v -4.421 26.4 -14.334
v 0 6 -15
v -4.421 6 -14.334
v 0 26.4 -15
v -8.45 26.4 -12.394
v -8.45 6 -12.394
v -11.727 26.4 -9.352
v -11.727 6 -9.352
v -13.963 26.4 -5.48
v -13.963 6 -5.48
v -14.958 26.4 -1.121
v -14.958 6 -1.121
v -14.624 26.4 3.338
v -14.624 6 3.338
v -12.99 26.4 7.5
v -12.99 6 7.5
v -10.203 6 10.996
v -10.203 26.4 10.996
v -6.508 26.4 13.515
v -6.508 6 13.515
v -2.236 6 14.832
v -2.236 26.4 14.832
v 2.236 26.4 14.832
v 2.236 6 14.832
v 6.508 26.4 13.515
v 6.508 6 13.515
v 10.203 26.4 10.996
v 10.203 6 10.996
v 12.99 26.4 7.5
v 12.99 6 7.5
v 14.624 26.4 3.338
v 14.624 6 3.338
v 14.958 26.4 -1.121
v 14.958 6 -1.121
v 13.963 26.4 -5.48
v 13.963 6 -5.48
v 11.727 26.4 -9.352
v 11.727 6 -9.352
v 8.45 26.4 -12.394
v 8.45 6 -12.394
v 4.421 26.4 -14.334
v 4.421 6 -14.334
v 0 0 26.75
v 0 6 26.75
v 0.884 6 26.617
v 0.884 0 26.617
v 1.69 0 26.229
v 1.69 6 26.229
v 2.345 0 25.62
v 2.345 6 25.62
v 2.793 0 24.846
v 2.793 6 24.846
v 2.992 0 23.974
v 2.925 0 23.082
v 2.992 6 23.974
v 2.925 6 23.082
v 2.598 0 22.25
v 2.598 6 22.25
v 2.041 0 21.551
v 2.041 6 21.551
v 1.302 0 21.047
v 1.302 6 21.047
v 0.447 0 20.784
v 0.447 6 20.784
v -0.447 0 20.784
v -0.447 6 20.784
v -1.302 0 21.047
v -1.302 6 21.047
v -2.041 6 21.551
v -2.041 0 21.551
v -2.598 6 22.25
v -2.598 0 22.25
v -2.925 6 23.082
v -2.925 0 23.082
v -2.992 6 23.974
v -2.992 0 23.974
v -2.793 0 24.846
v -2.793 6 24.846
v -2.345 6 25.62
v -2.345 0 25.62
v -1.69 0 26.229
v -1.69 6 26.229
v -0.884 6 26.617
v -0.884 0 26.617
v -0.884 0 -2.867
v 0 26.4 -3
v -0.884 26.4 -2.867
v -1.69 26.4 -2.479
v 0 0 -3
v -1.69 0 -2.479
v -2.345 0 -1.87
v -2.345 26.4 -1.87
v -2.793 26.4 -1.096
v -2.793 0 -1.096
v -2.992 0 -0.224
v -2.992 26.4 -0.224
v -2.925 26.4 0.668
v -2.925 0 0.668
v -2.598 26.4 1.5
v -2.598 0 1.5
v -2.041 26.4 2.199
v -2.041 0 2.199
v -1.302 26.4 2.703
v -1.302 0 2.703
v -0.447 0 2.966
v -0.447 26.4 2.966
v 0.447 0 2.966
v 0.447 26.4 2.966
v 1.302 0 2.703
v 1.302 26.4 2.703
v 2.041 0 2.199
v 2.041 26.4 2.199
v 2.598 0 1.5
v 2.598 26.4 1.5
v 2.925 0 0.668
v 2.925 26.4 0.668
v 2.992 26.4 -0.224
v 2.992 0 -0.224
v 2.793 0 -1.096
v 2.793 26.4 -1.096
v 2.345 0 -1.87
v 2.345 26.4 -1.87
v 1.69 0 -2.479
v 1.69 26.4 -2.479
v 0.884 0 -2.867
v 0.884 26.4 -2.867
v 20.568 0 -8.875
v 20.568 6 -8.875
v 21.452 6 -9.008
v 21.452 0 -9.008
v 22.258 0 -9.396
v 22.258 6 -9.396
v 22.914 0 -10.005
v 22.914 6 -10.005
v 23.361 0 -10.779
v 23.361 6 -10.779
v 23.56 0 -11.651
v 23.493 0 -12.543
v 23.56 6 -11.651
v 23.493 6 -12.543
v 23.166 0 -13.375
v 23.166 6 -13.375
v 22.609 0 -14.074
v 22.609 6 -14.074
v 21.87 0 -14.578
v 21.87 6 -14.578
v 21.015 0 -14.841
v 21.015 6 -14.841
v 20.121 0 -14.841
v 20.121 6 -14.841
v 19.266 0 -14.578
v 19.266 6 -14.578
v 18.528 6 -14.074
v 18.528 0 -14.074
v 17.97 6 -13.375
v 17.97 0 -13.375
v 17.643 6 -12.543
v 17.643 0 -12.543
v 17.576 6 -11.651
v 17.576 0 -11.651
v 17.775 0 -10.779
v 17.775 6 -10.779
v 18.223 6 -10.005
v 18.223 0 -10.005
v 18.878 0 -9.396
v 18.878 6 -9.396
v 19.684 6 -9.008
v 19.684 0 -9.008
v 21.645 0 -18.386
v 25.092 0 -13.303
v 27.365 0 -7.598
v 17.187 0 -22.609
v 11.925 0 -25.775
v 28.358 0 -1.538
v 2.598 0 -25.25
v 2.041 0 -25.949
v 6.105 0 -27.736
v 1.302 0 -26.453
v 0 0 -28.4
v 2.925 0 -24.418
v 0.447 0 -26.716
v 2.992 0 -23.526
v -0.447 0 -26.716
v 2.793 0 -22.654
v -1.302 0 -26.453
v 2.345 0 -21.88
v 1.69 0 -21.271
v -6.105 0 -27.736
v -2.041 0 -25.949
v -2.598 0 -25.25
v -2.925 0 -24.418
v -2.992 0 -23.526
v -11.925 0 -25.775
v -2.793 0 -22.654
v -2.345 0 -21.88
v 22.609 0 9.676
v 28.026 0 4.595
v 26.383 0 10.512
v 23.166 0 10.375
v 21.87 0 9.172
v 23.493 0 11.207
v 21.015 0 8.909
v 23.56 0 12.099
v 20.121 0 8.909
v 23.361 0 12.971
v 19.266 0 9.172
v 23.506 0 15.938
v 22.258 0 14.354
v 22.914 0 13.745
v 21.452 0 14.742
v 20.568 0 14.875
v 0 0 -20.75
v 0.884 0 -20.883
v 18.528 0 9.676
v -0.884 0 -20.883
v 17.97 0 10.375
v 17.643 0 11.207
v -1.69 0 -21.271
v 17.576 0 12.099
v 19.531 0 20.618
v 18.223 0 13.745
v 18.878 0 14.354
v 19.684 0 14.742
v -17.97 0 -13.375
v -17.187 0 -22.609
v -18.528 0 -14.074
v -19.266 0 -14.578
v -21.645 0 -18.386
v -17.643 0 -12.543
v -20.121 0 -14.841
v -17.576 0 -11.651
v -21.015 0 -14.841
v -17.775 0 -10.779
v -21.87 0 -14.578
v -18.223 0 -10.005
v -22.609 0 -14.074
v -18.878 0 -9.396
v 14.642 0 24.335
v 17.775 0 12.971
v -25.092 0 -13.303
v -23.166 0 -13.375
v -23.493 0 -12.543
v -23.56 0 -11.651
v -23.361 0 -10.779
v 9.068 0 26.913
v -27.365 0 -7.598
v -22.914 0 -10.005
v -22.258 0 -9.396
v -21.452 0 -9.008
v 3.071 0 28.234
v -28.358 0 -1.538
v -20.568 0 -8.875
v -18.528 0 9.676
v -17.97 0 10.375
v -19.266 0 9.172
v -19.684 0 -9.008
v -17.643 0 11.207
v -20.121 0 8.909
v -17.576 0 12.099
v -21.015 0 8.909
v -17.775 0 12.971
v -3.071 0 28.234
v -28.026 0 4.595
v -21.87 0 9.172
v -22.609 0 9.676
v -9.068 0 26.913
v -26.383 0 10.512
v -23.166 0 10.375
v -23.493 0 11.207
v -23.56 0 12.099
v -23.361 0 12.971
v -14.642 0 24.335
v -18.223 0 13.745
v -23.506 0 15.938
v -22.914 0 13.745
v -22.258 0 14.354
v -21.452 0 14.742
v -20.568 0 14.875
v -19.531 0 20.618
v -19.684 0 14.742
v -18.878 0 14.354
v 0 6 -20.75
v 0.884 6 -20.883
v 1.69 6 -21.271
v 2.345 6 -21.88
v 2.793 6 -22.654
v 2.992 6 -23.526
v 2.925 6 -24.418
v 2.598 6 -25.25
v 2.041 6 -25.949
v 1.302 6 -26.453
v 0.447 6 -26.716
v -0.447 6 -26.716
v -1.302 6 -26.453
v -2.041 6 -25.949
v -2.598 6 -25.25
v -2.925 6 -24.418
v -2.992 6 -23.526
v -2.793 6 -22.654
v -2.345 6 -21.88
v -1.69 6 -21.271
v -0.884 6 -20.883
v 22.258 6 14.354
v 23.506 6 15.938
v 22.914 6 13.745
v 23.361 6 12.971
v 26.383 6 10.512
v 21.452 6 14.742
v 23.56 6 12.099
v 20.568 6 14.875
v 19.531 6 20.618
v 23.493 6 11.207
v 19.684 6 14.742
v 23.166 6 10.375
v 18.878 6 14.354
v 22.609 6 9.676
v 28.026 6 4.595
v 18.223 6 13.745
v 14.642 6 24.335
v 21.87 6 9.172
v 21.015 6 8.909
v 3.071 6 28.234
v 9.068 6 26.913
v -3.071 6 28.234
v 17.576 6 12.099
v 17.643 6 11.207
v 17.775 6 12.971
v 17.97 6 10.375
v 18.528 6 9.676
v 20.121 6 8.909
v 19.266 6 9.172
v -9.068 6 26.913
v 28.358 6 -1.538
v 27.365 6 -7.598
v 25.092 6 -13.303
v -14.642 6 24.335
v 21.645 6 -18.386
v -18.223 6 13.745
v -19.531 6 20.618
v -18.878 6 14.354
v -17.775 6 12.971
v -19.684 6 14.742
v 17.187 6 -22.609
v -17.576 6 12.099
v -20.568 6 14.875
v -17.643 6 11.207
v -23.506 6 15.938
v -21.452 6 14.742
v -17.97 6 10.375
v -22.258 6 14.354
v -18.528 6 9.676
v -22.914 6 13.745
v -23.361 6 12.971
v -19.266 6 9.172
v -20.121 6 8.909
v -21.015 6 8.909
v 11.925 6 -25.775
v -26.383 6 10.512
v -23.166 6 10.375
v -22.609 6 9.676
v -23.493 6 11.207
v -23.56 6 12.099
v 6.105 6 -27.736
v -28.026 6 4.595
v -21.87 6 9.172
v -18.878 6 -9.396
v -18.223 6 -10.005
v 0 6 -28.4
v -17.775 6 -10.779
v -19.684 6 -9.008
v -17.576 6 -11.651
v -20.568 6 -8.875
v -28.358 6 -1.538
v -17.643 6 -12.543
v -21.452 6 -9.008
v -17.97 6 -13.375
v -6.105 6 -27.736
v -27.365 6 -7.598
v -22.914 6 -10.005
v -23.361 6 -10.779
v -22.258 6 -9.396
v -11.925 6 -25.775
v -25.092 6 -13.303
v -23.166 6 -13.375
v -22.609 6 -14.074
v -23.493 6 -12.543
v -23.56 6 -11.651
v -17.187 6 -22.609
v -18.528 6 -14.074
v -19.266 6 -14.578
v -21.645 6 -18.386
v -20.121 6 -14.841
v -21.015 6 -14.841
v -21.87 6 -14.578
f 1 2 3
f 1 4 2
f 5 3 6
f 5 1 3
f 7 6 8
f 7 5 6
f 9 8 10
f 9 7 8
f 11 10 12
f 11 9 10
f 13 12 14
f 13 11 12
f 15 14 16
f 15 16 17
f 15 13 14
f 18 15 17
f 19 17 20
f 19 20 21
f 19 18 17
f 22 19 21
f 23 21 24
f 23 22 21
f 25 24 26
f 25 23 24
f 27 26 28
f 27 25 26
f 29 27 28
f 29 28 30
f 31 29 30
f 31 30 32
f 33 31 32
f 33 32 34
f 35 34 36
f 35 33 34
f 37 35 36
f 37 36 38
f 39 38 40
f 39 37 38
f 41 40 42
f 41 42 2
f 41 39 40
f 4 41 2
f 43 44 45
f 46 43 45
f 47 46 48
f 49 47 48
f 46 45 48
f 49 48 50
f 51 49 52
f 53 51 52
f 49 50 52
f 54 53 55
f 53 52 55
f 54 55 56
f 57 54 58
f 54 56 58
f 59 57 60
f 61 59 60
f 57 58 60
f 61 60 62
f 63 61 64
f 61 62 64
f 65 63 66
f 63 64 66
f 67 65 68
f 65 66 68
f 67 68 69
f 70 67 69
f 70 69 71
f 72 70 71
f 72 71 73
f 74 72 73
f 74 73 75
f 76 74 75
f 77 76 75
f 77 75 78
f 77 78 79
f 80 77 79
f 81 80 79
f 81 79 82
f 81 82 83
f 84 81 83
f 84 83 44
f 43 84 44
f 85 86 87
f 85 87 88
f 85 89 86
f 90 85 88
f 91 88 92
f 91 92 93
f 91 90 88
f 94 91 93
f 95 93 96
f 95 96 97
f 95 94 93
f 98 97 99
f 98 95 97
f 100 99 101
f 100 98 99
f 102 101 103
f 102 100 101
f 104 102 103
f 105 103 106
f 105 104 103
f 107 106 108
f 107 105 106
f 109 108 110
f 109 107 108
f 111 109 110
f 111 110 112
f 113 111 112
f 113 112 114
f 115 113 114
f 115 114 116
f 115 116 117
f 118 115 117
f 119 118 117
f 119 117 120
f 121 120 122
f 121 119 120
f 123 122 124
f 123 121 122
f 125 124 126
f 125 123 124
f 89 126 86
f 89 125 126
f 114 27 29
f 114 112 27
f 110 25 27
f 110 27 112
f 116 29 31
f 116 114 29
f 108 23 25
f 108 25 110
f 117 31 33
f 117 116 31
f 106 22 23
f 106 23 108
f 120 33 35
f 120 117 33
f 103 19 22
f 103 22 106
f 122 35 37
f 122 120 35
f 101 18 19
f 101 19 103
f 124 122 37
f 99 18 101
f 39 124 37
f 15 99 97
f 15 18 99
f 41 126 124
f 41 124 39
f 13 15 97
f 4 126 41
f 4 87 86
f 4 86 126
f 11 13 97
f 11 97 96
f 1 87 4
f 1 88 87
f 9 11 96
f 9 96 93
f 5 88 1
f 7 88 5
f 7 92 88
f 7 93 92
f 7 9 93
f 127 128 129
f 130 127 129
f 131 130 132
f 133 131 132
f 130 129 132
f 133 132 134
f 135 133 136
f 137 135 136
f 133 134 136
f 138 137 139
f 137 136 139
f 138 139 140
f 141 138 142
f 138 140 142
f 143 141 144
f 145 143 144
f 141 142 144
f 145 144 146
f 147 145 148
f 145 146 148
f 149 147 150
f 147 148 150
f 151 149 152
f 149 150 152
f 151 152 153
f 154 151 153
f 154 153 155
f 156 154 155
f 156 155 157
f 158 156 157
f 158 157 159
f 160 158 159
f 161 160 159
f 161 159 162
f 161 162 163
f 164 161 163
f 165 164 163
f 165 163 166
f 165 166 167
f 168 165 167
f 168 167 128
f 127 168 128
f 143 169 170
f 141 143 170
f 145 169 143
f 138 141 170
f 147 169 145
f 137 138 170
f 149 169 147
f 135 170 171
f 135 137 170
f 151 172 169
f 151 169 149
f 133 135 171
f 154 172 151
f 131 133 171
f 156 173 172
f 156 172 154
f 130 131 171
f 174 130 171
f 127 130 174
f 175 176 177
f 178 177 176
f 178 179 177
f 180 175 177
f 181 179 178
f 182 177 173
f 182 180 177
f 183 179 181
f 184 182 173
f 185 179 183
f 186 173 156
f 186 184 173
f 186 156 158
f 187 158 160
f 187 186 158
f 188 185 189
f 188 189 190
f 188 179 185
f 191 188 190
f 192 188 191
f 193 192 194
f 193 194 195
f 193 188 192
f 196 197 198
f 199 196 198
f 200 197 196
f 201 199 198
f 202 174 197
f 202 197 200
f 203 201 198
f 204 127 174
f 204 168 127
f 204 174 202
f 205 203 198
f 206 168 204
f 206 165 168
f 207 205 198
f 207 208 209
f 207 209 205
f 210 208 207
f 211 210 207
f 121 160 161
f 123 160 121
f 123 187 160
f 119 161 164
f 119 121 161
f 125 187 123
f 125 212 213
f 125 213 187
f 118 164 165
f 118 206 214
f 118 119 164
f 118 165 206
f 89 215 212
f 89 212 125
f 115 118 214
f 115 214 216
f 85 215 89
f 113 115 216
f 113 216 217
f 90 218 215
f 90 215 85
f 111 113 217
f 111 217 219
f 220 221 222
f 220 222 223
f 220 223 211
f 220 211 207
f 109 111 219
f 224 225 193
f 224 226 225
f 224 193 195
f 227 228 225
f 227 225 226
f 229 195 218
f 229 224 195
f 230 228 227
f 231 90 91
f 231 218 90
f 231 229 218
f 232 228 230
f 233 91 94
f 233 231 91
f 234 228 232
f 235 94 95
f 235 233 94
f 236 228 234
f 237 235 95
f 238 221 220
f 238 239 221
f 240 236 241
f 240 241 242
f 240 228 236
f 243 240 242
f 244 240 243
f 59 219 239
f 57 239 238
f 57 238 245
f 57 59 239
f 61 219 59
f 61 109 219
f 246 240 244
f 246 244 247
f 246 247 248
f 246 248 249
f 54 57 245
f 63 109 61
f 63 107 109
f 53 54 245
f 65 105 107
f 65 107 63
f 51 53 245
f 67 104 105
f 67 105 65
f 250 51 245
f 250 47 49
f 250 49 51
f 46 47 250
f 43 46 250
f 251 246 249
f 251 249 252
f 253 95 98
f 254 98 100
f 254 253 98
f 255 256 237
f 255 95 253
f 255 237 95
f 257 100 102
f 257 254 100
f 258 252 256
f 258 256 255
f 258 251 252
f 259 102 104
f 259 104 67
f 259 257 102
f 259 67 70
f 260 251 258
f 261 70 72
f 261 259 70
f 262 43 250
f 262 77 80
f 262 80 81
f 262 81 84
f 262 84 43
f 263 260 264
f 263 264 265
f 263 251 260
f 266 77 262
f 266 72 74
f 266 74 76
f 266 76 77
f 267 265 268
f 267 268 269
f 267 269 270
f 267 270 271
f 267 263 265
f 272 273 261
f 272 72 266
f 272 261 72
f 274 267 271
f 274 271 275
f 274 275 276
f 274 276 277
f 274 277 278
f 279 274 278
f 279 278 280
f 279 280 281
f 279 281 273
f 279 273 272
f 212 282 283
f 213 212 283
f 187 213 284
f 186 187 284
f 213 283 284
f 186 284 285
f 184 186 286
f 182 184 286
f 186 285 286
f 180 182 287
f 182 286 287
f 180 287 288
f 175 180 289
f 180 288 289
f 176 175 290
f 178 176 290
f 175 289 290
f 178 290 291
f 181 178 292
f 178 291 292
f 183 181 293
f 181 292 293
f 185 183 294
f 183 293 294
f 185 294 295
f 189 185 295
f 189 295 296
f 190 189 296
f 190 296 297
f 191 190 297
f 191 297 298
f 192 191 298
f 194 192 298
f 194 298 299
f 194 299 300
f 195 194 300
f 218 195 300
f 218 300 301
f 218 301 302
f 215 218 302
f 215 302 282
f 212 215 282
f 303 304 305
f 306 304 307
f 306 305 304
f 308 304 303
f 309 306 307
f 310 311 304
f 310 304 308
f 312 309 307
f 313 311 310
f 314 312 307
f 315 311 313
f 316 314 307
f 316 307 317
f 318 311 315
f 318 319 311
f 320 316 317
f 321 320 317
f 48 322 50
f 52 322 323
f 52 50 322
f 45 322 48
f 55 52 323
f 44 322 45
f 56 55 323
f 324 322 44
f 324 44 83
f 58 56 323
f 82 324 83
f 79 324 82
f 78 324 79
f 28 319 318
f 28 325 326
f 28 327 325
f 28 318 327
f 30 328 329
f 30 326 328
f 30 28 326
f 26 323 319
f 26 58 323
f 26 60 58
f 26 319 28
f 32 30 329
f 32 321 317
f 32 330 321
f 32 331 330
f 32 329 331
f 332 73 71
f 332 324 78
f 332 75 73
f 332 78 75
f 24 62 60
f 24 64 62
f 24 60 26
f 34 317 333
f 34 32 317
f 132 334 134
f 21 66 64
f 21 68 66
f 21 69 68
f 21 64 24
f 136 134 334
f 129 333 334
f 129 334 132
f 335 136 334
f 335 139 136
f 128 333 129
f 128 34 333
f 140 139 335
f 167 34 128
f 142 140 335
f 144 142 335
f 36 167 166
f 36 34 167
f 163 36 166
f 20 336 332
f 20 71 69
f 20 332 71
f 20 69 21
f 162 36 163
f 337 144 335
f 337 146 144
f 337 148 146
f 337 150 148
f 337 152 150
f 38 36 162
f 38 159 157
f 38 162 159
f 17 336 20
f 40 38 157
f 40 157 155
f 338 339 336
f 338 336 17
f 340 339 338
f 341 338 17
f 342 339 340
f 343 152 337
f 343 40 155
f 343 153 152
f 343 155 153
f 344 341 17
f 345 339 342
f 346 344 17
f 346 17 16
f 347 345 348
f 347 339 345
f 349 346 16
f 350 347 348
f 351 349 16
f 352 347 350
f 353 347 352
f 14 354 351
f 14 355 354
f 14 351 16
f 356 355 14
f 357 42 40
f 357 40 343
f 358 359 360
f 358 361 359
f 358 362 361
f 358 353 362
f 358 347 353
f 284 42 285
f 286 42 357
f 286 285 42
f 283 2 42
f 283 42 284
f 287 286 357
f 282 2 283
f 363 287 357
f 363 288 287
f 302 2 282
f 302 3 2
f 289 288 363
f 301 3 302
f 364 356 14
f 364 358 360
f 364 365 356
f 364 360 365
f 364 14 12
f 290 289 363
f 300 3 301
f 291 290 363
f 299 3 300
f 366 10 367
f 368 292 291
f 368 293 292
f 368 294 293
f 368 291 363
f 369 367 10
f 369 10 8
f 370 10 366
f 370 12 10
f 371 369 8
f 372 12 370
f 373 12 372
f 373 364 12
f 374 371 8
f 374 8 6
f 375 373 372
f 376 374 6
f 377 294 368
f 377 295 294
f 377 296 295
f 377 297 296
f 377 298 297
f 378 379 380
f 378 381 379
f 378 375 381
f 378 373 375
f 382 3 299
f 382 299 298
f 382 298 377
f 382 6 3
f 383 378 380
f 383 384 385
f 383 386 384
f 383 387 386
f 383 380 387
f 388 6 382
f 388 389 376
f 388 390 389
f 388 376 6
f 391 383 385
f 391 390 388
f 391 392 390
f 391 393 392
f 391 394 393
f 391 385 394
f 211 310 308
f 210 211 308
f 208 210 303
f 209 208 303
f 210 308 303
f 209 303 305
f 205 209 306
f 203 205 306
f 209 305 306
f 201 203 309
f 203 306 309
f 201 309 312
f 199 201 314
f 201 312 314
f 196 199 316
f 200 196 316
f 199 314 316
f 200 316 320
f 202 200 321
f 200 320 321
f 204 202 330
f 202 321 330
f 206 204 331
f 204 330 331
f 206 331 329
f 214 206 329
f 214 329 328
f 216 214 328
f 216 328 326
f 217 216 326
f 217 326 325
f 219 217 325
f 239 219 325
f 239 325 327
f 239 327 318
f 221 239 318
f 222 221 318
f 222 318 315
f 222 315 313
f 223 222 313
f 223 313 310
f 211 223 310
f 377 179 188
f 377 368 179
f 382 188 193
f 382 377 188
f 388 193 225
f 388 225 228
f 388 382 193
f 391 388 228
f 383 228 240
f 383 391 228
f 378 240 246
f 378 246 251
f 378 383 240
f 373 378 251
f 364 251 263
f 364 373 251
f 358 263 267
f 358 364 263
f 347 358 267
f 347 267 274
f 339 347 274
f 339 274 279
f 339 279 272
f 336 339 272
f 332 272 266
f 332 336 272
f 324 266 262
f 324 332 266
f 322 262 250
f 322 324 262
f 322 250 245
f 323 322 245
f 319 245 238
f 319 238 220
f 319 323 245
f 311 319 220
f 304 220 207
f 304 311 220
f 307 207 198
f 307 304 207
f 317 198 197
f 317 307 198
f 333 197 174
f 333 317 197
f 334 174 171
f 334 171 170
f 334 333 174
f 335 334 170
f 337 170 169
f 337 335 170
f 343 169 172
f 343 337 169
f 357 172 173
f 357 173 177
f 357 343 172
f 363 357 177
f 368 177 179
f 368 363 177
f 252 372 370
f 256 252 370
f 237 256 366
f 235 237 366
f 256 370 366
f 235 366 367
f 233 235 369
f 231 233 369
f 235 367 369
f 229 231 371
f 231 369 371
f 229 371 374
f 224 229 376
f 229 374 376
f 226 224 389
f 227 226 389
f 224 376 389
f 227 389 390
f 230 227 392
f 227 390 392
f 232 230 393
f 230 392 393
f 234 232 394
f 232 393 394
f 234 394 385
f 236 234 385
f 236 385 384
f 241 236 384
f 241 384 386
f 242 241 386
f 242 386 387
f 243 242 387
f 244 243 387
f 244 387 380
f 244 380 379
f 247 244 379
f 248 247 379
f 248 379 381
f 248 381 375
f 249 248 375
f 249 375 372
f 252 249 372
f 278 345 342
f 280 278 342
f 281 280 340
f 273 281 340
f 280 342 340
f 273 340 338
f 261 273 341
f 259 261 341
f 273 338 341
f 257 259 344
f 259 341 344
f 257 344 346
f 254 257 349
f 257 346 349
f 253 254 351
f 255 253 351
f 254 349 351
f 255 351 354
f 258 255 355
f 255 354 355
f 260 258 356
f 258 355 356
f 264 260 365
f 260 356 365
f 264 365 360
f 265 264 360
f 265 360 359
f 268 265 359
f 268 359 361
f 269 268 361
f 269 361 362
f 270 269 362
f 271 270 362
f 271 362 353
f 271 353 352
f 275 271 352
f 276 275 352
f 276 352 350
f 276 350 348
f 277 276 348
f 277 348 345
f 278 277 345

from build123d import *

# Parameters (mm, degrees)
SKETCH2_R          = 3
CUT_EXTRUDE1_DEPTH = 46.047530454


with BuildPart() as part:
    # Sketch1 → Revolve1 (revolve)
    with BuildSketch(Plane(origin=(0, 0, 0), x_dir=(0, 0, -1), z_dir=(1, 0, 0)), mode=Mode.PRIVATE) as revolve1_sk:
        Polygon((-3, 0), (-28.4, 0), (-28.4, 6), (-15, 6), (-15, 26.4), (-3, 26.4), align=None)
    revolve(revolve1_sk.sketch.rotate(Axis((0, 0, 0), (0, 1, 0)), 180), axis=Axis((0, 0, 0), (0, 1, 0)))

    # Sketch2 → Cut-Extrude1 (cut, through all)
    with BuildSketch(Plane(origin=(0, 6, 0), x_dir=(1, 0, 0), z_dir=(0, 1, 0))):
        with Locations(Location((0, 23.75, 0), (0, 0, 270))):
            Circle(SKETCH2_R)
        with Locations(Location((20.56810334, 11.875, 0), (0, 0, 270))):
            Circle(SKETCH2_R)
        with Locations(Location((20.56810334, -11.875, 0), (0, 0, 270))):
            Circle(SKETCH2_R)
        with Locations(Location((0, -23.75, 0), (0, 0, 270))):
            Circle(SKETCH2_R)
        with Locations(Location((-20.56810334, -11.875, 0), (0, 0, 270))):
            Circle(SKETCH2_R)
        with Locations(Location((-20.56810334, 11.875, 0), (0, 0, 270))):
            Circle(SKETCH2_R)
    extrude(amount=-CUT_EXTRUDE1_DEPTH, mode=Mode.SUBTRACT)


solid = part.part
